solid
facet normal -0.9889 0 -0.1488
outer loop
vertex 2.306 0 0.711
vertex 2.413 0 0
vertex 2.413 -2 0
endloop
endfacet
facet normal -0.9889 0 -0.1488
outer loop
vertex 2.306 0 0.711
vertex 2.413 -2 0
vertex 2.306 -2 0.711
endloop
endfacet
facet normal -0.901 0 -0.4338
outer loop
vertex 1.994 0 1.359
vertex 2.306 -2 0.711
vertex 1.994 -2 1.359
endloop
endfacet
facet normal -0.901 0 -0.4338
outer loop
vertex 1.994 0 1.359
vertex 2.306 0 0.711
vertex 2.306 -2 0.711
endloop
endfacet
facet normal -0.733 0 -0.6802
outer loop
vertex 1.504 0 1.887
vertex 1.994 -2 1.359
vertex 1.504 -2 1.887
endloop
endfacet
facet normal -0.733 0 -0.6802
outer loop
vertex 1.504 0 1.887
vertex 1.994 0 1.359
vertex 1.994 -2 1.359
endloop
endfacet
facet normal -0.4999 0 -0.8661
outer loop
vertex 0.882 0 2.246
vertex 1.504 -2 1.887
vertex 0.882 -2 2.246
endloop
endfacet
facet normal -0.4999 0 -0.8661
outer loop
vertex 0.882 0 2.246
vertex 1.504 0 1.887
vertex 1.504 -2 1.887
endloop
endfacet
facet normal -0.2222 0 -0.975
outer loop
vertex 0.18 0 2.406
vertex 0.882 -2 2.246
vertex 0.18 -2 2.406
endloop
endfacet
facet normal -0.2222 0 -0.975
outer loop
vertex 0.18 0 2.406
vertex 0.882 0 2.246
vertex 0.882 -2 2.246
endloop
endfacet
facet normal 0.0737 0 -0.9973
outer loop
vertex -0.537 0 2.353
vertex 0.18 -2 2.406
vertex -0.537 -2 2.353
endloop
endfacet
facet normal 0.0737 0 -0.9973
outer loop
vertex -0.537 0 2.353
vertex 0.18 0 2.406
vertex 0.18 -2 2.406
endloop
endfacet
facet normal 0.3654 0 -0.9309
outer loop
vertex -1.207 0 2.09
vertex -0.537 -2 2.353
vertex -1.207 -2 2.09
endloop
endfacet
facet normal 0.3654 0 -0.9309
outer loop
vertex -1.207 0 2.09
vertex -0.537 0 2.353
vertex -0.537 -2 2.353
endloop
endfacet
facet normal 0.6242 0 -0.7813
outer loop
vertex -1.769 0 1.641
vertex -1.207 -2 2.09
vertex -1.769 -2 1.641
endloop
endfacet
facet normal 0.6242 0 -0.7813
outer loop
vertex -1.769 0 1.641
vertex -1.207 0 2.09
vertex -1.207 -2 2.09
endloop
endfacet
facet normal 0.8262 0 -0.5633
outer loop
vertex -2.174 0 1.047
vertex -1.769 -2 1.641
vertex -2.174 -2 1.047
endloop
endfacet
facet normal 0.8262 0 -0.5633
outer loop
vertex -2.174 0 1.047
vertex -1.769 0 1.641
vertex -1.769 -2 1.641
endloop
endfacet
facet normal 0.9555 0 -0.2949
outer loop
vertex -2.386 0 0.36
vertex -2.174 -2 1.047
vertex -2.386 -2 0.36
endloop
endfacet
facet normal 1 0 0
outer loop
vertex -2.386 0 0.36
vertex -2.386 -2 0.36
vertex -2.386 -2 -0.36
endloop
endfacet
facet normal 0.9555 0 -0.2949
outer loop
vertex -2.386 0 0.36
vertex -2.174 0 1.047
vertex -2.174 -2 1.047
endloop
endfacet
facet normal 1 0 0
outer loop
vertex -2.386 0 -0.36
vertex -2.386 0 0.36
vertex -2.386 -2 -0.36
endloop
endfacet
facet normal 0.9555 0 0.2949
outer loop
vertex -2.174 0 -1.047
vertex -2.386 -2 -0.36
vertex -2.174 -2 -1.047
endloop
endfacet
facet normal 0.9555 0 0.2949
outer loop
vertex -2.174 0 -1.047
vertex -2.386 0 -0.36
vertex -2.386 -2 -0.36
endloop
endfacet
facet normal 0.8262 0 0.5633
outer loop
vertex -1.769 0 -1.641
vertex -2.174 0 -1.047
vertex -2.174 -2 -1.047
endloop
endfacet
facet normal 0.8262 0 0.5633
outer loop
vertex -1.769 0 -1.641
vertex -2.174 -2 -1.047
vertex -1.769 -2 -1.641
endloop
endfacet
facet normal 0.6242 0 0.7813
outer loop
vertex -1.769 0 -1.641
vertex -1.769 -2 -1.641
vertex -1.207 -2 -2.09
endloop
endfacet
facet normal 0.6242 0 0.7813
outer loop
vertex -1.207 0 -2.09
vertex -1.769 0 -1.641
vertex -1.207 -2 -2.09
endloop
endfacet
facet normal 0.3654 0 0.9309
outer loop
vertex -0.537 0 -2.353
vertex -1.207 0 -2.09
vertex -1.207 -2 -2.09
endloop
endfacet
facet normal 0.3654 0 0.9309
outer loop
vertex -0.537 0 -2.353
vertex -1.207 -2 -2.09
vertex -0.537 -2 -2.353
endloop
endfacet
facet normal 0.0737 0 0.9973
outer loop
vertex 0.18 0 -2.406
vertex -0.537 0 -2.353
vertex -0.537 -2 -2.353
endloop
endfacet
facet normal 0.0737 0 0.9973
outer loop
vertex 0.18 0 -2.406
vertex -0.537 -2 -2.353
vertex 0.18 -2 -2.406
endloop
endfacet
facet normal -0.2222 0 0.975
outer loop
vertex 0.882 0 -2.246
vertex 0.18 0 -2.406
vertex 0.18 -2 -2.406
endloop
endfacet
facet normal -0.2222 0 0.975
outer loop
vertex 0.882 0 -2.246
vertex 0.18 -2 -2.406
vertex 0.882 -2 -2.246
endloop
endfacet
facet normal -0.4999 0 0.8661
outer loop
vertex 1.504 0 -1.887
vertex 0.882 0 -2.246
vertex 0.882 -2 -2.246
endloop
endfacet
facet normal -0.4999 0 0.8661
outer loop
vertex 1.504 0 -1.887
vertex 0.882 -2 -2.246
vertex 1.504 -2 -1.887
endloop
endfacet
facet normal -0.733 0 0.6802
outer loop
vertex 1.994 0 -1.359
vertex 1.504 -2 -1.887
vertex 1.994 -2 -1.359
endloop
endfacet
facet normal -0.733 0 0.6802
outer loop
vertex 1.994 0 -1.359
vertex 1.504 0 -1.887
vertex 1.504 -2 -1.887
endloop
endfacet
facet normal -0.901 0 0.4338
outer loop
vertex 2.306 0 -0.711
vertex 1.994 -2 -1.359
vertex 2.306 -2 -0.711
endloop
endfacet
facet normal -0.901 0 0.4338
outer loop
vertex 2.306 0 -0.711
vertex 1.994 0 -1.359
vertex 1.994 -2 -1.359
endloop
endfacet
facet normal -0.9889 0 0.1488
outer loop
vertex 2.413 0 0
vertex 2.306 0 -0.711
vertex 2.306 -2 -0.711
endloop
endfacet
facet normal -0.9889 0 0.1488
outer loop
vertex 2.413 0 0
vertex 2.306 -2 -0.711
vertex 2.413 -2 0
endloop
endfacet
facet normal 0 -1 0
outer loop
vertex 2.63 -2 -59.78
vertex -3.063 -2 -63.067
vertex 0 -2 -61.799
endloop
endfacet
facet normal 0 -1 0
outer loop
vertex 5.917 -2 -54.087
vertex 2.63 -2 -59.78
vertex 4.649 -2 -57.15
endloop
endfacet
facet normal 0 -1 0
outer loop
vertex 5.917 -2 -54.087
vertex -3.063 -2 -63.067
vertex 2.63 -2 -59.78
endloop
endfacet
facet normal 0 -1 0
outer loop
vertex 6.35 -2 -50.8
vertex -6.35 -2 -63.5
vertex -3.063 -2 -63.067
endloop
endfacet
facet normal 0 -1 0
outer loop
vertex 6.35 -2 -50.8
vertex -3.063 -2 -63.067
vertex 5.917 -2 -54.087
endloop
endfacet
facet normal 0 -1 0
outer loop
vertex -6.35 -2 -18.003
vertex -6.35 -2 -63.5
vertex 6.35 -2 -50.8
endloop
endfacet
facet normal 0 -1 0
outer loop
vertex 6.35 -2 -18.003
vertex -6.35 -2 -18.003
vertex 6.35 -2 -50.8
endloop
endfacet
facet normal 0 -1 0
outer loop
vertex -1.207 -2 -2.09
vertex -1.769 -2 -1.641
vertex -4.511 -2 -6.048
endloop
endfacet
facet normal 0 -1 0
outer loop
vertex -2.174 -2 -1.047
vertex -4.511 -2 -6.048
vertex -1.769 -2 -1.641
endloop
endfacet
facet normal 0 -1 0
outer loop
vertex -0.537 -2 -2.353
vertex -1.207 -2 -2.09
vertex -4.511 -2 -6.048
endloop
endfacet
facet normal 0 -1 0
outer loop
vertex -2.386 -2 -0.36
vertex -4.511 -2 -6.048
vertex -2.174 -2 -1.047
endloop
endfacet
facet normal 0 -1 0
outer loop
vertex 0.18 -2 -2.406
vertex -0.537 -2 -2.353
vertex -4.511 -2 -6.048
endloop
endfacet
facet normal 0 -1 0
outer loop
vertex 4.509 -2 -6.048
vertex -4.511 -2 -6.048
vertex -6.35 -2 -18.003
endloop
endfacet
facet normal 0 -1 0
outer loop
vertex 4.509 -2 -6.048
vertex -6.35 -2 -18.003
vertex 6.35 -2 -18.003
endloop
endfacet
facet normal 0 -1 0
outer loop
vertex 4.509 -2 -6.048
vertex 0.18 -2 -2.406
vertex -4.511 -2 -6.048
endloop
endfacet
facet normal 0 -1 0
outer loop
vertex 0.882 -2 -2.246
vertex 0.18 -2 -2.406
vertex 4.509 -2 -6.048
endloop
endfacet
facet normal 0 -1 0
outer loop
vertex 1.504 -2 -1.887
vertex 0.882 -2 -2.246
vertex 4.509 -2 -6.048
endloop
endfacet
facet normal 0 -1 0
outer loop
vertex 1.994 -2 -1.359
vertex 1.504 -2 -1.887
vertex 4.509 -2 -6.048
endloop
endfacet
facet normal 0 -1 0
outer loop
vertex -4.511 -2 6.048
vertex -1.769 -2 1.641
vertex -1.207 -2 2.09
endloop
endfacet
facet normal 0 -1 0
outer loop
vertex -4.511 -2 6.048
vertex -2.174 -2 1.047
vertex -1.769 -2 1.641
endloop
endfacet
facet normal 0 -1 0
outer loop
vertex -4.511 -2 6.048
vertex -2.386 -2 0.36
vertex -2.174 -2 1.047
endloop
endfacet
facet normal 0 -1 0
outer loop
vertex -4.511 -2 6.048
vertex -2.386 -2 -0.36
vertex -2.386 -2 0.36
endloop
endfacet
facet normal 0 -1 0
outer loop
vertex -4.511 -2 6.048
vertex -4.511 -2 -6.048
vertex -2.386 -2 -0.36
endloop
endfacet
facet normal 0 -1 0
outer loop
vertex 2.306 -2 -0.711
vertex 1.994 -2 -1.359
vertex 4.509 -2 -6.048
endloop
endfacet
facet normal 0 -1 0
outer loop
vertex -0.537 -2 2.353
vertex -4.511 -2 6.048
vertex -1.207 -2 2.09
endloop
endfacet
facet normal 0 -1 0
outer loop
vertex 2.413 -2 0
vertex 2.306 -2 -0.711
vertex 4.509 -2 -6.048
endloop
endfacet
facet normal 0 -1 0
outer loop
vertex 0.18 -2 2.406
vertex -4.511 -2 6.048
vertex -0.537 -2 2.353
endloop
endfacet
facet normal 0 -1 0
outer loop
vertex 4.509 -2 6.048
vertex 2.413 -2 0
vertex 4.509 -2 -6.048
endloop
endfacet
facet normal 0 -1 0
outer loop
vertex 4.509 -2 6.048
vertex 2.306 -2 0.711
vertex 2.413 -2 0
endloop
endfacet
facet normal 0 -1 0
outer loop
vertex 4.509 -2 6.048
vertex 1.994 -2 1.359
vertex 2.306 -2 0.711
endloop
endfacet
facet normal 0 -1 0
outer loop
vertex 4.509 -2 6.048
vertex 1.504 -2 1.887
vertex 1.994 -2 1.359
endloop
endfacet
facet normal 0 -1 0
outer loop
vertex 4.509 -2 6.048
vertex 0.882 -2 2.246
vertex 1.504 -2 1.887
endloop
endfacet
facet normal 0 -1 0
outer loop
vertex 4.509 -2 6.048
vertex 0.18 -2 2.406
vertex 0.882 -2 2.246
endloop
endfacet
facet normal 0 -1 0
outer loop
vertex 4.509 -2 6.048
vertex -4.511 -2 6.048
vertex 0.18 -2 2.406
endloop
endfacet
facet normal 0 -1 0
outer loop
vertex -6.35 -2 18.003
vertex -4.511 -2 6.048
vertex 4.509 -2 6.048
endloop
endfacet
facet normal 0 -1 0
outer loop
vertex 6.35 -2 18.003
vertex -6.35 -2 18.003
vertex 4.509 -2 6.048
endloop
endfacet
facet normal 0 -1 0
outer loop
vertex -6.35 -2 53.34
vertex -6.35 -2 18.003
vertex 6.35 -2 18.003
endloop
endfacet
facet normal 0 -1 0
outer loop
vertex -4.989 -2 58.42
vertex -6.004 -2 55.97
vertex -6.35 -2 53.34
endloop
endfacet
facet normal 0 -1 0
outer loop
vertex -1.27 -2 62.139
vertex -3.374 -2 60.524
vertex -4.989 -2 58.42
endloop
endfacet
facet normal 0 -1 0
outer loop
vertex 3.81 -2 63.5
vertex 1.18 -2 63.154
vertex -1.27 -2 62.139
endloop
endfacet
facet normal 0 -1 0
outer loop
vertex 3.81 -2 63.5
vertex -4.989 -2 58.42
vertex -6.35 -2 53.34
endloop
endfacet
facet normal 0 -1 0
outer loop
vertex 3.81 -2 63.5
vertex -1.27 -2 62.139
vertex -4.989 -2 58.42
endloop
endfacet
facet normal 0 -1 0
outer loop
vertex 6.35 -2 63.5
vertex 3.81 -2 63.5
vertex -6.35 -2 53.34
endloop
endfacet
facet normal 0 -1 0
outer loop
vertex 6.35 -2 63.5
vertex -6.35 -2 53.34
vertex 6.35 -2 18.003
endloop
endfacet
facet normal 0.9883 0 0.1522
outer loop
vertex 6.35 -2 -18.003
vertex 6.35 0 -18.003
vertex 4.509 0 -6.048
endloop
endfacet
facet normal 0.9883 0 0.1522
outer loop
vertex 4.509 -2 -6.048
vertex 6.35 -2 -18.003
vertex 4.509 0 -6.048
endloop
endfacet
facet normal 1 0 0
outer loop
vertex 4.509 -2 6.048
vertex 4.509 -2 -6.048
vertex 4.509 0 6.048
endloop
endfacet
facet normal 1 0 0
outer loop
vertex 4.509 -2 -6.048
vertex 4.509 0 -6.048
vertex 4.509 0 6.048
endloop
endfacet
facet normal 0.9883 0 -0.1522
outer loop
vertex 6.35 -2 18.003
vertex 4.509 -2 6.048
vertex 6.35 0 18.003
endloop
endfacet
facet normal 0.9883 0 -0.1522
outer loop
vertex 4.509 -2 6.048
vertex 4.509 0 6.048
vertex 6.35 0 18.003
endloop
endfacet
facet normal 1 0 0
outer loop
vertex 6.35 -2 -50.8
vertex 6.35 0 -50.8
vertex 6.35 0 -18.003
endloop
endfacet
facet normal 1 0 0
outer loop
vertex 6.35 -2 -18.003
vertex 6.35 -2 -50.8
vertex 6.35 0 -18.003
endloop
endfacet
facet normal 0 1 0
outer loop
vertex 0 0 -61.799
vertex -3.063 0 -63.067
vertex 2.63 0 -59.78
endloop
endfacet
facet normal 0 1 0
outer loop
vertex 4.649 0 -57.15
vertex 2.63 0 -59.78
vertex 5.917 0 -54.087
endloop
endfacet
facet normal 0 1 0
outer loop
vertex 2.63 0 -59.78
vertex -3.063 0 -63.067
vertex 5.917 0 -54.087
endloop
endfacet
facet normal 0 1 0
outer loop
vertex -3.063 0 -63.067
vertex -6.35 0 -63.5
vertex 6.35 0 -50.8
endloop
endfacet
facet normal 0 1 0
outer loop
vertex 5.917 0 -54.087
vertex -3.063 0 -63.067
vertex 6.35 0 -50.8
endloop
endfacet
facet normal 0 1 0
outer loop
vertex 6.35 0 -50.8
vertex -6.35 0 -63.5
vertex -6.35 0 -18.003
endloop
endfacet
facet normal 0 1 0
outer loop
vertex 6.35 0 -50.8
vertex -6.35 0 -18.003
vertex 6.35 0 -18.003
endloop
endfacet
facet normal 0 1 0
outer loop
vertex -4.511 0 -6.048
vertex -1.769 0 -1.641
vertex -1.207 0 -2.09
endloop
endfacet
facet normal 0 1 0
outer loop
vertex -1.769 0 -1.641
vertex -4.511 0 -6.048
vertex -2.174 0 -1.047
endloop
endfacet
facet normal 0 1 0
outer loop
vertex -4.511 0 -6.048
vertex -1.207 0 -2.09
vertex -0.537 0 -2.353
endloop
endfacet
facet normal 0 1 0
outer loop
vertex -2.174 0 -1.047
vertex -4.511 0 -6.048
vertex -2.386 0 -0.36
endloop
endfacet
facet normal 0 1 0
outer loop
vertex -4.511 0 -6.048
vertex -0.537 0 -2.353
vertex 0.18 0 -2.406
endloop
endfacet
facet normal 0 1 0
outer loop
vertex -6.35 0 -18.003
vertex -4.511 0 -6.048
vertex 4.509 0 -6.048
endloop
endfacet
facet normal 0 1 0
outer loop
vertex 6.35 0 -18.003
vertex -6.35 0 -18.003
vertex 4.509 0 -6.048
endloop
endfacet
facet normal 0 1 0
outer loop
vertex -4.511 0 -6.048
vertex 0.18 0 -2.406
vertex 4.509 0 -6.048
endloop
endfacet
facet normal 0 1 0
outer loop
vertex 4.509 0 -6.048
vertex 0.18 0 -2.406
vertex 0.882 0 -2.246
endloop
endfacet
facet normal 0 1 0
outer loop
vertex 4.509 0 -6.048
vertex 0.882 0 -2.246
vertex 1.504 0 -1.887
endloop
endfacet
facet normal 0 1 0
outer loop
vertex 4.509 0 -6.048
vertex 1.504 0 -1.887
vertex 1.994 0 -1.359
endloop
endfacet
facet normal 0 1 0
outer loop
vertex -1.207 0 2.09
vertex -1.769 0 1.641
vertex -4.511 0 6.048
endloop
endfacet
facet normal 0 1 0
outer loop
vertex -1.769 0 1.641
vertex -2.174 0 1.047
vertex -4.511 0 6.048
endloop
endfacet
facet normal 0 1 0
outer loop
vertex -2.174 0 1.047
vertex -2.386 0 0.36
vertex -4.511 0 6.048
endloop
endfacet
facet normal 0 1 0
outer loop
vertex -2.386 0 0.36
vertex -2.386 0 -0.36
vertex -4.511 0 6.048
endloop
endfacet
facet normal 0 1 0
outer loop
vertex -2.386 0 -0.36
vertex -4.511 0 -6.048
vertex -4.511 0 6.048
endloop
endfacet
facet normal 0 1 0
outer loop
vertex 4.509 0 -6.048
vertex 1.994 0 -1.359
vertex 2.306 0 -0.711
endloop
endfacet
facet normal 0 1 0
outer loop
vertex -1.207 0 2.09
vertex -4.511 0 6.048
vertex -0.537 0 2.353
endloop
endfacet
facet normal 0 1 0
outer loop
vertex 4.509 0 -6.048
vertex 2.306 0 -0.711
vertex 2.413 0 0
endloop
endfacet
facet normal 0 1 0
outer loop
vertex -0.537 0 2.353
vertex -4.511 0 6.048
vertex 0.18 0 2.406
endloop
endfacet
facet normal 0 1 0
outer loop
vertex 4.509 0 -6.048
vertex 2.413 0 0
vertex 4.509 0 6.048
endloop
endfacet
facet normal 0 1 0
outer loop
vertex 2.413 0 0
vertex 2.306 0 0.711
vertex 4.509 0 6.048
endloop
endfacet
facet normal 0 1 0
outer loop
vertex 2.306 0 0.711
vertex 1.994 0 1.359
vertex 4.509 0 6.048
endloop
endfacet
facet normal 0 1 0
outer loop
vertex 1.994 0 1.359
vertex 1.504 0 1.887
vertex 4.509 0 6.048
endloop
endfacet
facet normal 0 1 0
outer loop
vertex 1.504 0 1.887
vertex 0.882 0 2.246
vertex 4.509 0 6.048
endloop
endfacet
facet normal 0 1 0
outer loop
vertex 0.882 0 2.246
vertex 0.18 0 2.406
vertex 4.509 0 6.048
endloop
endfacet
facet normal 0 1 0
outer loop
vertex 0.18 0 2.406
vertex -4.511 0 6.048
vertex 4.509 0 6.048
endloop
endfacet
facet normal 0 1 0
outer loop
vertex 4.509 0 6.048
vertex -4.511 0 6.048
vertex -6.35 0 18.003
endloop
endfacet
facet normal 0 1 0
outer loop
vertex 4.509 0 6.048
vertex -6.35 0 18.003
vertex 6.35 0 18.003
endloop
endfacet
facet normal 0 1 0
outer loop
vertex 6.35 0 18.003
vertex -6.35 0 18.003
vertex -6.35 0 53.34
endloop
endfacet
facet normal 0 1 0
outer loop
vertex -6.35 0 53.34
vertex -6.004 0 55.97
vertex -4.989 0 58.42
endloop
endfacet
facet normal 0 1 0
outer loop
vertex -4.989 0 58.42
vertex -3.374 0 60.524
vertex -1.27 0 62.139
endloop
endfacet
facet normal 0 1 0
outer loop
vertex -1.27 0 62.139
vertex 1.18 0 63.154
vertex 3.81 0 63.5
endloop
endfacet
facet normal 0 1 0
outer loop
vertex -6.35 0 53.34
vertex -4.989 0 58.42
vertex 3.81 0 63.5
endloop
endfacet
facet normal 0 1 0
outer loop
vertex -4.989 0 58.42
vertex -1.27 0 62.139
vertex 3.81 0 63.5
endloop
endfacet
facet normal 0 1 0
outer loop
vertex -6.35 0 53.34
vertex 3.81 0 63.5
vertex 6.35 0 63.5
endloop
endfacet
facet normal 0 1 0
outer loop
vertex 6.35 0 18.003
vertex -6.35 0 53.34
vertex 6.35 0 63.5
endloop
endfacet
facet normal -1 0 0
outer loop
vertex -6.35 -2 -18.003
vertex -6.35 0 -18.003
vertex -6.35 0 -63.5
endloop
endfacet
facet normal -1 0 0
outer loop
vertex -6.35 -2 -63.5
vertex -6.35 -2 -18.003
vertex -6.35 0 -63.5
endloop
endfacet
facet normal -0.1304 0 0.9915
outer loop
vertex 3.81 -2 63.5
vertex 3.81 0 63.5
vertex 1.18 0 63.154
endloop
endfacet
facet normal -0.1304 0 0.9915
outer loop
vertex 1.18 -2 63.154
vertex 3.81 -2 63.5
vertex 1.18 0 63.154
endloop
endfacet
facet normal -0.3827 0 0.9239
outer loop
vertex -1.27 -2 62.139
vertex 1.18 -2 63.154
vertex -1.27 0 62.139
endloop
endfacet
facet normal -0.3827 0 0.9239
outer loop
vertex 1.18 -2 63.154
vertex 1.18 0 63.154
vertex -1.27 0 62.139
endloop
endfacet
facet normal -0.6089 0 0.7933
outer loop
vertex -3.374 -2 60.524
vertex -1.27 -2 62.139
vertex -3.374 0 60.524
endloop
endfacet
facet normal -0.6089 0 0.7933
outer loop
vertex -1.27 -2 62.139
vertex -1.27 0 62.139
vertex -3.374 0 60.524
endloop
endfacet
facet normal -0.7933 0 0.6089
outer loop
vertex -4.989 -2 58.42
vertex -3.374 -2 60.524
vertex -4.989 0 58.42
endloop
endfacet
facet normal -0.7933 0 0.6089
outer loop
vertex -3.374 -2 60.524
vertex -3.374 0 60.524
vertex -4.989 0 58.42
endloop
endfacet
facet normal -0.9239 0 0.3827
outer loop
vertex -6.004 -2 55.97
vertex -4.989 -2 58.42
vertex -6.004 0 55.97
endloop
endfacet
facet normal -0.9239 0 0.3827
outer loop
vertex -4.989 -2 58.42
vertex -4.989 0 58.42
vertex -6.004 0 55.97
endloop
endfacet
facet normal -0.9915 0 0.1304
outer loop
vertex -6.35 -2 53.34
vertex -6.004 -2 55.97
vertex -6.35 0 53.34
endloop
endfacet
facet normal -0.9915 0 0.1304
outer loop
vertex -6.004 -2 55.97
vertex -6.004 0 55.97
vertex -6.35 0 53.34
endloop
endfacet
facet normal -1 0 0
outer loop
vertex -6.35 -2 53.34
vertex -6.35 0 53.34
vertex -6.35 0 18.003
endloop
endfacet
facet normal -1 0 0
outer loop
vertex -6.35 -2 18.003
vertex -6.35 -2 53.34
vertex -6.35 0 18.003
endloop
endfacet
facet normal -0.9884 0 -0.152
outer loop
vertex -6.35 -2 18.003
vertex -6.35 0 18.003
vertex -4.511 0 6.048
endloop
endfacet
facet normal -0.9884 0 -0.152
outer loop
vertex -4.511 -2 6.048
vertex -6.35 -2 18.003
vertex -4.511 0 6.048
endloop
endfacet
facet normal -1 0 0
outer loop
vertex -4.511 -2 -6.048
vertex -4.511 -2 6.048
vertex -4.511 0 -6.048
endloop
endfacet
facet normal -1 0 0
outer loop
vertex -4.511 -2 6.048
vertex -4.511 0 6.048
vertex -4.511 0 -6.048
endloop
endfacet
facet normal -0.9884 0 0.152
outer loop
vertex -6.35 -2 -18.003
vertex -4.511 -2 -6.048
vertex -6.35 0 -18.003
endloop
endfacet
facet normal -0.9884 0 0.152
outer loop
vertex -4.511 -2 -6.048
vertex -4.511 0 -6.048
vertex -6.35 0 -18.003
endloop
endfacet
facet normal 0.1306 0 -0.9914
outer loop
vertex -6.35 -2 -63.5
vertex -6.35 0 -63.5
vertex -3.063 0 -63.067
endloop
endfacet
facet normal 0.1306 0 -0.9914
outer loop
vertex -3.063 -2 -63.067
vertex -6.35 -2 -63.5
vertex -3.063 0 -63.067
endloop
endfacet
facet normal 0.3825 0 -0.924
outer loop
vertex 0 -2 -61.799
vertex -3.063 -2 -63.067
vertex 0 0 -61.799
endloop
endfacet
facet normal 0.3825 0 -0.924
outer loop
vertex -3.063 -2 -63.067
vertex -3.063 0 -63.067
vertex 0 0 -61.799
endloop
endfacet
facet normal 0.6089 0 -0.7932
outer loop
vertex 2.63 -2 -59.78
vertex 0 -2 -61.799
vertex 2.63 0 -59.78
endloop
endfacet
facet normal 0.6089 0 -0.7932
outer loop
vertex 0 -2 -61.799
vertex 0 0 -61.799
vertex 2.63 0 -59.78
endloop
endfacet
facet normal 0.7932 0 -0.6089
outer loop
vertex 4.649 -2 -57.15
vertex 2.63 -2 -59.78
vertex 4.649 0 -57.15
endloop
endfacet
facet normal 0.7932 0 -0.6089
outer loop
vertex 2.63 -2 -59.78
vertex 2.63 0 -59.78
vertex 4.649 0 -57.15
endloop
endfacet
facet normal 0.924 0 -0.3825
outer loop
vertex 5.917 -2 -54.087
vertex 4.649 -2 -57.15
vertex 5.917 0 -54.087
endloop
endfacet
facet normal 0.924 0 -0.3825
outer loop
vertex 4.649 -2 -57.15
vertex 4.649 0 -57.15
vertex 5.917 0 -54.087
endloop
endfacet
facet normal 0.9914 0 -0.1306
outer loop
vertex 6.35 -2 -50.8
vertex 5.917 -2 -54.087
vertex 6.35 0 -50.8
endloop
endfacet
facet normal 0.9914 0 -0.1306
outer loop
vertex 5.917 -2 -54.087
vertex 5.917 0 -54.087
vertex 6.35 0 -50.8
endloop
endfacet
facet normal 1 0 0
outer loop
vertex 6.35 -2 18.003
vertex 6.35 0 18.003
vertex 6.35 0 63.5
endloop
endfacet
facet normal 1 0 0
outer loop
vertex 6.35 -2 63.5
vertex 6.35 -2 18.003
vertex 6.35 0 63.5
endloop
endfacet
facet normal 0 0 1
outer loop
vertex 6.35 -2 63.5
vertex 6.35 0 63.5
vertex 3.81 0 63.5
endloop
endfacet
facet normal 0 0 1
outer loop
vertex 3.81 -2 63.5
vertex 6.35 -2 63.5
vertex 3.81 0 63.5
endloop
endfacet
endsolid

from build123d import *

# Parameters (mm, degrees)
F0_R     = 2.413
F1_DEPTH = 2


with BuildPart() as f1:
    # F0 (on Front) → F1 (new body)
    with BuildSketch(Plane.XZ):
        with BuildLine():
            Line((6.35, 63.5), (3.81, 63.5))
            ThreePointArc((3.81, 63.5), (-3.374205, 60.524205), (-6.35, 53.34))
            Line((-6.35, 53.34), (-6.35, 18.002914))
            ThreePointArc((-6.35, 18.002914), (-4.280137, 0), (-6.35, -18.002914))
            Line((-6.35, -18.002914), (-6.35, -63.5))
            ThreePointArc((-6.35, -63.5), (2.630256, -59.780256), (6.35, -50.8))
            Line((6.35, -50.8), (6.35, -18.002914))
            ThreePointArc((6.35, -18.002914), (4.278073, 0), (6.35, 18.002914))
            Line((6.35, 18.002914), (6.35, 63.5))
        make_face()
        Circle(F0_R, mode=Mode.SUBTRACT)
    extrude(amount=F1_DEPTH)


solid = f1.part
